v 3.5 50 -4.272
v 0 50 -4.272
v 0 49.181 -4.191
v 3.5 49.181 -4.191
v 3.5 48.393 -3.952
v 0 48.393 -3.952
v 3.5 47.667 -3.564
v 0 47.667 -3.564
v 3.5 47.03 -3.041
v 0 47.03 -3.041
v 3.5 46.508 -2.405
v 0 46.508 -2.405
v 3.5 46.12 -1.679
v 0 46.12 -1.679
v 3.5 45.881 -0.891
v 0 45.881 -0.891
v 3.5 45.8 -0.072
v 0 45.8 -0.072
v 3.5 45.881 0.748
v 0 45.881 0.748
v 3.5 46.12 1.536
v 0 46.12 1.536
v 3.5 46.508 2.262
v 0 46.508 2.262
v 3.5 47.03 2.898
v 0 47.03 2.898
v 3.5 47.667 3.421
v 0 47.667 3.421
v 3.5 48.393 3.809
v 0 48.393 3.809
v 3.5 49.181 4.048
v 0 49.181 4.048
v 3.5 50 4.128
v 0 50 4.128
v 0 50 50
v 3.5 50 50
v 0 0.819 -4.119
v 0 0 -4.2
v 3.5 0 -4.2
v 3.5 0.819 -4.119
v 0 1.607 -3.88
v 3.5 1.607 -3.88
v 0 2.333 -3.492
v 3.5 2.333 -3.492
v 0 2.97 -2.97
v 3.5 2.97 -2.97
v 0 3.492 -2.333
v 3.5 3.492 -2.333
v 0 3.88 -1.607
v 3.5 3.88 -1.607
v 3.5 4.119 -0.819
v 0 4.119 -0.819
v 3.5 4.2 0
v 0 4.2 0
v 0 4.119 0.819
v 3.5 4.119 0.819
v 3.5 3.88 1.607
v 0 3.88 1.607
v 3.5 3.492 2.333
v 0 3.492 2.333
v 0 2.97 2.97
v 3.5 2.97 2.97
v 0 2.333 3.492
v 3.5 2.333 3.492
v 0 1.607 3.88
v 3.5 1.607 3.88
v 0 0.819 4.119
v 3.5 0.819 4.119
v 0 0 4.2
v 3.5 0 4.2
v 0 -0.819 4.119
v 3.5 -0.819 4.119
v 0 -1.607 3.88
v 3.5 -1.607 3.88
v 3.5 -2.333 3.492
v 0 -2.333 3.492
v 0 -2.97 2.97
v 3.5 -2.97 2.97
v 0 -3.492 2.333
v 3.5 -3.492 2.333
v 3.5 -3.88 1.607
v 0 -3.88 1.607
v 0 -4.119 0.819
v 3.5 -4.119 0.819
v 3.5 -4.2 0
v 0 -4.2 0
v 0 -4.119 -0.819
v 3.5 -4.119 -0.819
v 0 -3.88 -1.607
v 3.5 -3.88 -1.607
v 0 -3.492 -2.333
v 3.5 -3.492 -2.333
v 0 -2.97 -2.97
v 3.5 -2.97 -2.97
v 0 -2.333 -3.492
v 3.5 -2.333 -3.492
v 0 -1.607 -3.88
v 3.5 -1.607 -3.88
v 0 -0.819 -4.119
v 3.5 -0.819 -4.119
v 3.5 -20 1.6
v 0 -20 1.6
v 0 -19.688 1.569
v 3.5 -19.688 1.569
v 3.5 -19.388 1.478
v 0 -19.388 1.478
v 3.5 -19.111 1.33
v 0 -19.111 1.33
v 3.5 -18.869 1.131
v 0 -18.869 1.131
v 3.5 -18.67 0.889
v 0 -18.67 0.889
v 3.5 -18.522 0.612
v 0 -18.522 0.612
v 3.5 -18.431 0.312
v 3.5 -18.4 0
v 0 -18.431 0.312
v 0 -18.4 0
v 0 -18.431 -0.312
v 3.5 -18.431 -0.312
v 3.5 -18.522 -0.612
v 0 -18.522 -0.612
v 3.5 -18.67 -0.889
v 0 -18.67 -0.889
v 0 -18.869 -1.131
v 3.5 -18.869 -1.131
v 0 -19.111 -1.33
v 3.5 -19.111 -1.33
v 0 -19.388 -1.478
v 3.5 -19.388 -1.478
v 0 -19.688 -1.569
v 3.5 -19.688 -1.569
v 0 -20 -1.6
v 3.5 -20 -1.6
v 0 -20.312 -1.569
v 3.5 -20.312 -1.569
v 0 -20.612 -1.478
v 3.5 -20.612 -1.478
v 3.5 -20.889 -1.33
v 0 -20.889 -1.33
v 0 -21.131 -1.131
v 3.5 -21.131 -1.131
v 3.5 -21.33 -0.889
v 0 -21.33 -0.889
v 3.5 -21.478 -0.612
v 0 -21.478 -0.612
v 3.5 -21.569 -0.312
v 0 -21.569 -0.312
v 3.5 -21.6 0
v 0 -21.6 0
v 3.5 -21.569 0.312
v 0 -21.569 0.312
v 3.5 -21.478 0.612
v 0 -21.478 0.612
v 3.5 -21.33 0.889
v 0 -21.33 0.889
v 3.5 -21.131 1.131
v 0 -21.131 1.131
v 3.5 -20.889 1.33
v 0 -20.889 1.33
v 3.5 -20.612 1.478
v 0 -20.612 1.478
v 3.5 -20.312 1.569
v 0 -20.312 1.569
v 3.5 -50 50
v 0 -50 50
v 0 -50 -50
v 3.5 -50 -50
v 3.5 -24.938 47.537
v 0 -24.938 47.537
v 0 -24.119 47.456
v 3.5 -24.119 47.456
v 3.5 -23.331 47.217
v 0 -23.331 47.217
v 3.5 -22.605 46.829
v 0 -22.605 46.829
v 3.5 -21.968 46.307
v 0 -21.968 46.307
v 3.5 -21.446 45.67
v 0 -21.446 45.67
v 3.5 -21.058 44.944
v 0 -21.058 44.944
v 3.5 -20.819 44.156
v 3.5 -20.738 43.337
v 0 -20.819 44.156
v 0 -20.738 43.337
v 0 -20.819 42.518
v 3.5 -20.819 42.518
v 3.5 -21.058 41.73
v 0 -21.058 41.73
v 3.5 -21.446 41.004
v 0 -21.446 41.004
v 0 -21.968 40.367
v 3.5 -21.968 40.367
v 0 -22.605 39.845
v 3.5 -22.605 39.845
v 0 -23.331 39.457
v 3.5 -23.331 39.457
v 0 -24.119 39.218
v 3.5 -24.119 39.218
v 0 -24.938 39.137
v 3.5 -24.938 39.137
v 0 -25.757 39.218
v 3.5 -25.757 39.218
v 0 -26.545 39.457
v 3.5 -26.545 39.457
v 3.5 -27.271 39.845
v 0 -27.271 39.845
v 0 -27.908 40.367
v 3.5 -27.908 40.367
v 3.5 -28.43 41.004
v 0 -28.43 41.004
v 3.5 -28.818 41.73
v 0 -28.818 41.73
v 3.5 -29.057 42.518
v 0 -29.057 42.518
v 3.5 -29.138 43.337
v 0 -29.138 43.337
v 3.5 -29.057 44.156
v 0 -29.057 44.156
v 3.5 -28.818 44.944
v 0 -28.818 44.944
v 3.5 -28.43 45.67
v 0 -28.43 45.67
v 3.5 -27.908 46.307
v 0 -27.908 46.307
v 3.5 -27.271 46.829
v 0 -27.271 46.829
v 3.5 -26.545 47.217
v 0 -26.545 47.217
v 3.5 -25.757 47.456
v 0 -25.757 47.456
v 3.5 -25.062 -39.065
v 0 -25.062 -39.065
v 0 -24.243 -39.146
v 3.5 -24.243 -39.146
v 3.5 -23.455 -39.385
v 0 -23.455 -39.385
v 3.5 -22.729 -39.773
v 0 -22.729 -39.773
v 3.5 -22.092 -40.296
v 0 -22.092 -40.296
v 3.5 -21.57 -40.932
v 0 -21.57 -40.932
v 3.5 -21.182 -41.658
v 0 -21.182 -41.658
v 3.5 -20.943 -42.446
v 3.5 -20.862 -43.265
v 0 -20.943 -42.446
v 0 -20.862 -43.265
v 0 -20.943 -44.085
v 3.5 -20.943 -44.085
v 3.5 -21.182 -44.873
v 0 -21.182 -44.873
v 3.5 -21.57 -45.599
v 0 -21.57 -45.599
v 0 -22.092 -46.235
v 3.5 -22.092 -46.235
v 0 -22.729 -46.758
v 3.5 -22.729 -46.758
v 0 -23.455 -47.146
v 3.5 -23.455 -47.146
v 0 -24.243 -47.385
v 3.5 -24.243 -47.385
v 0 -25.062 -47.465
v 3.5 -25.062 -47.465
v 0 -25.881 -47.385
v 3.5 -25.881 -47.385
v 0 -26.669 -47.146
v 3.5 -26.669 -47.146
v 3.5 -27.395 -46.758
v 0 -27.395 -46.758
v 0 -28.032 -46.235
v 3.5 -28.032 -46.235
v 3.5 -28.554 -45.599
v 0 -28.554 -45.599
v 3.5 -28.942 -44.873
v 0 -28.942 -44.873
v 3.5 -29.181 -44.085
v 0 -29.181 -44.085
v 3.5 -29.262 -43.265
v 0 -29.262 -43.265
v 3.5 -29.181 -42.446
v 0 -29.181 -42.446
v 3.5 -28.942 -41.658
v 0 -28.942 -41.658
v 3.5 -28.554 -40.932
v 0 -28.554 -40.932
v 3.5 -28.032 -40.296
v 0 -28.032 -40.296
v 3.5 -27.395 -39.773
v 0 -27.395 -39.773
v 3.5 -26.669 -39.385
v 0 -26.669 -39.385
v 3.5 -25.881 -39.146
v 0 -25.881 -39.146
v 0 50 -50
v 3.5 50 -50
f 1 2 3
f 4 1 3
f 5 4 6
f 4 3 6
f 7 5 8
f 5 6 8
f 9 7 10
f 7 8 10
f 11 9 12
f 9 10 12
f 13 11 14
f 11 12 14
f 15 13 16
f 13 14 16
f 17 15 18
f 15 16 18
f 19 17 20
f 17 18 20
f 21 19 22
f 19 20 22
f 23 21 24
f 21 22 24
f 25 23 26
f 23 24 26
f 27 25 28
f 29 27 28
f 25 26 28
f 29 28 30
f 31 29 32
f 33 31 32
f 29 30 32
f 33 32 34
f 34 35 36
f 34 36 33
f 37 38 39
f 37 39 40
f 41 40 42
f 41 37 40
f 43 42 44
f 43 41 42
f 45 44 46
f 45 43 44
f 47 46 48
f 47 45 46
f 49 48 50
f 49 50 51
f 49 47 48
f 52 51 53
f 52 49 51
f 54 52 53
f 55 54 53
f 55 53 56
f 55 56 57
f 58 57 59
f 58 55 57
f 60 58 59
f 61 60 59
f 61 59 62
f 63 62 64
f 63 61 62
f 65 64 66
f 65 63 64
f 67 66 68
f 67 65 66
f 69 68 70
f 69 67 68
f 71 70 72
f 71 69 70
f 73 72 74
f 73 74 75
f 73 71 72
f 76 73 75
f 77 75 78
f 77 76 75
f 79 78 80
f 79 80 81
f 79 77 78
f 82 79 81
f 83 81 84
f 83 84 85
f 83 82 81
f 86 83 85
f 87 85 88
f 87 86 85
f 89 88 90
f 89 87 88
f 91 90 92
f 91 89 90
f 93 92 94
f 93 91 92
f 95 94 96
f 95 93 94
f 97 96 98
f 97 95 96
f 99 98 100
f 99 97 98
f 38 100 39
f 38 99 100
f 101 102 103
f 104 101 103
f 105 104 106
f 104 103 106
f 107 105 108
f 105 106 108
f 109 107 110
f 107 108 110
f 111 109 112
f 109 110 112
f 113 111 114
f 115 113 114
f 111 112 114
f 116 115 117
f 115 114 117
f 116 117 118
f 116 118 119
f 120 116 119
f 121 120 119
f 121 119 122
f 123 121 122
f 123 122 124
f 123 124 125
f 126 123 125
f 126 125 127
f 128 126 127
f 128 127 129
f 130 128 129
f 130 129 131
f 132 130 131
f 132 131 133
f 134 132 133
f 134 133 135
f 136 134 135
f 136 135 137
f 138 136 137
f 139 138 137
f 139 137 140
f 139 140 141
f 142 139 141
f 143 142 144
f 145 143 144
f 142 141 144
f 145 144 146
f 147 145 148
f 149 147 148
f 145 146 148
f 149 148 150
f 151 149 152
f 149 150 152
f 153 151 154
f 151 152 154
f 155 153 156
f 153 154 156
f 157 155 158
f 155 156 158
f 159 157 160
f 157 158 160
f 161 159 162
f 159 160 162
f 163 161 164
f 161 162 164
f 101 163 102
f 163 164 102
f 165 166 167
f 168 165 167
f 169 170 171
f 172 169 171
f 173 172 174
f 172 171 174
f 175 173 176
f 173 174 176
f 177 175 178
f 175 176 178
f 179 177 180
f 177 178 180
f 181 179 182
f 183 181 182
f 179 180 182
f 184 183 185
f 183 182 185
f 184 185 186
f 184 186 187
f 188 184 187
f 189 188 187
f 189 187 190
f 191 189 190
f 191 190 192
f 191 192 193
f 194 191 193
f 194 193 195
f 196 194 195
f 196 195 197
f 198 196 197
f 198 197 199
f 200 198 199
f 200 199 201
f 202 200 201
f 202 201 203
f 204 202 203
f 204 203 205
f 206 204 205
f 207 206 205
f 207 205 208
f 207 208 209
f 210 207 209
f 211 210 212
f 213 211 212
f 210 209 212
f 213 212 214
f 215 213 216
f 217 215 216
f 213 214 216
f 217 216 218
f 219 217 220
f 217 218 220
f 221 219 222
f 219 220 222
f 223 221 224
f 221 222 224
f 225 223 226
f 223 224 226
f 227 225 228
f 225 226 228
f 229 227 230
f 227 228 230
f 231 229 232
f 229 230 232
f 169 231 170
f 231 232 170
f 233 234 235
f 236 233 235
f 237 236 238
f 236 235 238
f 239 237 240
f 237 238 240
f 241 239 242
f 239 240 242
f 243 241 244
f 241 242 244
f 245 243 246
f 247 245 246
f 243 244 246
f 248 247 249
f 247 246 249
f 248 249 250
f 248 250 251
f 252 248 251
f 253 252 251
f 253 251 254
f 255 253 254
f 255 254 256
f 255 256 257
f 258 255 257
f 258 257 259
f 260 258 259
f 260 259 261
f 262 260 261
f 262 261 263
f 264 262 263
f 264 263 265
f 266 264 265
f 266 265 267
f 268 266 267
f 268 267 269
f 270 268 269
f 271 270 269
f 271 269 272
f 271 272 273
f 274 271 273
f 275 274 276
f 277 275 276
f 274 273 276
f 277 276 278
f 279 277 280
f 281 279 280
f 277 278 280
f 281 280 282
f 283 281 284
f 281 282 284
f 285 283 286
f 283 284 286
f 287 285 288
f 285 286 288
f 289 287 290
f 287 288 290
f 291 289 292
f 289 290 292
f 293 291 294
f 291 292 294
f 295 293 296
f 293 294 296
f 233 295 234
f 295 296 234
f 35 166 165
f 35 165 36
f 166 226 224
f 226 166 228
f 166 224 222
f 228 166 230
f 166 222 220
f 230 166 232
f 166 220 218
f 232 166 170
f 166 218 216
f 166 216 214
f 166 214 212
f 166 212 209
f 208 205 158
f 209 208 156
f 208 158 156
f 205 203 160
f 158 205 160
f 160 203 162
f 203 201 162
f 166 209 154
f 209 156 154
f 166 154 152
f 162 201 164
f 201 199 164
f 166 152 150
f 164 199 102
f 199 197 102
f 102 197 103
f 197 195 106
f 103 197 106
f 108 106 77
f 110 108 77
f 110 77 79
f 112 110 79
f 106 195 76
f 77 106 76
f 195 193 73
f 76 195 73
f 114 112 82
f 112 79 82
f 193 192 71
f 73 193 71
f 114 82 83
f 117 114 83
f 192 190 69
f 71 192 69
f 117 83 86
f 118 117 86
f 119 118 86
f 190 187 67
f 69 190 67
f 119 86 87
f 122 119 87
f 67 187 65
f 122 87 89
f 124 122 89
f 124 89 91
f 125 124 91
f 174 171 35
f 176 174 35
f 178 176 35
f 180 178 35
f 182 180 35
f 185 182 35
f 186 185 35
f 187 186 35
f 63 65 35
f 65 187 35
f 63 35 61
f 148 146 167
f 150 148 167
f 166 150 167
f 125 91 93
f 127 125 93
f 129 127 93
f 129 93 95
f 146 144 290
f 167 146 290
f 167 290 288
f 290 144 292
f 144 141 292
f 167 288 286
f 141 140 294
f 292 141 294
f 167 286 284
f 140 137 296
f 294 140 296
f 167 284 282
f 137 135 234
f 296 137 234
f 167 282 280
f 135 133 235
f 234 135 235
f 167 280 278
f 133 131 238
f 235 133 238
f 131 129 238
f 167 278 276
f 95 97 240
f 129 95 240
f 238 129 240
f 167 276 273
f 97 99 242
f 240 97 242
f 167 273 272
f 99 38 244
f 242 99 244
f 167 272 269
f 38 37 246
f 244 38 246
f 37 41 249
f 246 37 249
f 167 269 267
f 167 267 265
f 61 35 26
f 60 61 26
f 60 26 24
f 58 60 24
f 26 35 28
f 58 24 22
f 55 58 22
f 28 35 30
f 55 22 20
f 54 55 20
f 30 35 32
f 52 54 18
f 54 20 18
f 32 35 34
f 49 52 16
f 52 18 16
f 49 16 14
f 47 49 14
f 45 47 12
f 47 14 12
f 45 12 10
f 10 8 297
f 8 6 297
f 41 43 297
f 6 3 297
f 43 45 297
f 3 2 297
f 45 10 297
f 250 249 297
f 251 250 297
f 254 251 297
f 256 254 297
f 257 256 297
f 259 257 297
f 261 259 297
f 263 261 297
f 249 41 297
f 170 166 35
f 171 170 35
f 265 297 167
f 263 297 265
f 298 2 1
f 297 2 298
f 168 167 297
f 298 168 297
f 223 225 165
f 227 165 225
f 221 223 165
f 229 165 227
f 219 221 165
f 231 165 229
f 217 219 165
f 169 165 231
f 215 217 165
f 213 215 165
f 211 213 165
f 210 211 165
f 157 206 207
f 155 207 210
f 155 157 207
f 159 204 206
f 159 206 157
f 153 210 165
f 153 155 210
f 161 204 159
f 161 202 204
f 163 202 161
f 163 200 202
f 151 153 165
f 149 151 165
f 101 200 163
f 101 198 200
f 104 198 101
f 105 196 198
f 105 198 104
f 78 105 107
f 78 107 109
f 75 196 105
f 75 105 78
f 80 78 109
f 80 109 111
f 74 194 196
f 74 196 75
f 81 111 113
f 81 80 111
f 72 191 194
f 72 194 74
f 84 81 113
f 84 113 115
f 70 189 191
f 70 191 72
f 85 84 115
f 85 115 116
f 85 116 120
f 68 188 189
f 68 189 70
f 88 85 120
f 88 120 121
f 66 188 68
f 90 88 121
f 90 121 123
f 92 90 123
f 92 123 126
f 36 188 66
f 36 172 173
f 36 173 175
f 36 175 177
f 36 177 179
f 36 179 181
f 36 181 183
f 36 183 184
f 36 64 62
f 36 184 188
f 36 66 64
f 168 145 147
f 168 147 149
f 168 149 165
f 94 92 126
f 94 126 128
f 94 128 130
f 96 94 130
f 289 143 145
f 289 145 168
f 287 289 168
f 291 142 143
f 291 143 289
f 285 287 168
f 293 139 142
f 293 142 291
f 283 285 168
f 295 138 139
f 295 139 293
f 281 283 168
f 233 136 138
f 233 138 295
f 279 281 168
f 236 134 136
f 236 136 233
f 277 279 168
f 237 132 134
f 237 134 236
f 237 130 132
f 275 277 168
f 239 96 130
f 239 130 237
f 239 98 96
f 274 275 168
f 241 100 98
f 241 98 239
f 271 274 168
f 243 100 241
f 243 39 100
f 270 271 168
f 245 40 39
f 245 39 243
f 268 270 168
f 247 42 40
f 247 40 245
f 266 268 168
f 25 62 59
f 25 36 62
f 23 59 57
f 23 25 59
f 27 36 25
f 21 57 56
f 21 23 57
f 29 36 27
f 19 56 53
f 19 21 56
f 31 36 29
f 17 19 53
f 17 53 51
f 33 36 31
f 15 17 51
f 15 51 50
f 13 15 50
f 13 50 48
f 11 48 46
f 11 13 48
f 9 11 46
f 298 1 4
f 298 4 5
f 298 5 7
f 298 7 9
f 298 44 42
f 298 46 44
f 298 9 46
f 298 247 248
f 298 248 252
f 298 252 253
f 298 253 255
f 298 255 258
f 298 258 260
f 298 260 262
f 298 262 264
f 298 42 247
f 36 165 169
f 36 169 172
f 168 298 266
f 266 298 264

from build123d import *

# Parameters (mm, degrees)
SKETCH2_W           = 100
SKETCH2_H           = 100
SKETCH2_R           = 4.2
BOSS_EXTRUDE1_DEPTH = 3.5
SKETCH3_R           = 4.2
CUT_EXTRUDE1_DEPTH  = 71.797245709
SKETCH4_R           = 1.6
CUT_EXTRUDE2_DEPTH  = 71.797245709


with BuildPart() as part:
    # Sketch2 → Boss-Extrude1 (new body)
    with BuildSketch(Plane(origin=(0, 0, 0), x_dir=(0, 0, -1), z_dir=(1, 0, 0))):
        Rectangle(SKETCH2_W, SKETCH2_H)
        Circle(SKETCH2_R, mode=Mode.SUBTRACT)
    extrude(amount=BOSS_EXTRUDE1_DEPTH)

    # Sketch3 → Cut-Extrude1 (cut, through all)
    with BuildSketch(Plane.ZY):
        with Locations((43.336976945, -24.938051834)):
            Circle(SKETCH3_R)
        with Locations((-43.265474881, -25.061897041)):
            Circle(SKETCH3_R)
        with Locations((-0.071502064, 49.999948875)):
            Circle(SKETCH3_R)
    extrude(amount=-CUT_EXTRUDE1_DEPTH, mode=Mode.SUBTRACT)

    # Sketch4 → Cut-Extrude2 (cut, through all)
    with BuildSketch(Plane.ZY):
        with Locations((0, -20)):
            Circle(SKETCH4_R)
    extrude(amount=-CUT_EXTRUDE2_DEPTH, mode=Mode.SUBTRACT)


solid = part.part
